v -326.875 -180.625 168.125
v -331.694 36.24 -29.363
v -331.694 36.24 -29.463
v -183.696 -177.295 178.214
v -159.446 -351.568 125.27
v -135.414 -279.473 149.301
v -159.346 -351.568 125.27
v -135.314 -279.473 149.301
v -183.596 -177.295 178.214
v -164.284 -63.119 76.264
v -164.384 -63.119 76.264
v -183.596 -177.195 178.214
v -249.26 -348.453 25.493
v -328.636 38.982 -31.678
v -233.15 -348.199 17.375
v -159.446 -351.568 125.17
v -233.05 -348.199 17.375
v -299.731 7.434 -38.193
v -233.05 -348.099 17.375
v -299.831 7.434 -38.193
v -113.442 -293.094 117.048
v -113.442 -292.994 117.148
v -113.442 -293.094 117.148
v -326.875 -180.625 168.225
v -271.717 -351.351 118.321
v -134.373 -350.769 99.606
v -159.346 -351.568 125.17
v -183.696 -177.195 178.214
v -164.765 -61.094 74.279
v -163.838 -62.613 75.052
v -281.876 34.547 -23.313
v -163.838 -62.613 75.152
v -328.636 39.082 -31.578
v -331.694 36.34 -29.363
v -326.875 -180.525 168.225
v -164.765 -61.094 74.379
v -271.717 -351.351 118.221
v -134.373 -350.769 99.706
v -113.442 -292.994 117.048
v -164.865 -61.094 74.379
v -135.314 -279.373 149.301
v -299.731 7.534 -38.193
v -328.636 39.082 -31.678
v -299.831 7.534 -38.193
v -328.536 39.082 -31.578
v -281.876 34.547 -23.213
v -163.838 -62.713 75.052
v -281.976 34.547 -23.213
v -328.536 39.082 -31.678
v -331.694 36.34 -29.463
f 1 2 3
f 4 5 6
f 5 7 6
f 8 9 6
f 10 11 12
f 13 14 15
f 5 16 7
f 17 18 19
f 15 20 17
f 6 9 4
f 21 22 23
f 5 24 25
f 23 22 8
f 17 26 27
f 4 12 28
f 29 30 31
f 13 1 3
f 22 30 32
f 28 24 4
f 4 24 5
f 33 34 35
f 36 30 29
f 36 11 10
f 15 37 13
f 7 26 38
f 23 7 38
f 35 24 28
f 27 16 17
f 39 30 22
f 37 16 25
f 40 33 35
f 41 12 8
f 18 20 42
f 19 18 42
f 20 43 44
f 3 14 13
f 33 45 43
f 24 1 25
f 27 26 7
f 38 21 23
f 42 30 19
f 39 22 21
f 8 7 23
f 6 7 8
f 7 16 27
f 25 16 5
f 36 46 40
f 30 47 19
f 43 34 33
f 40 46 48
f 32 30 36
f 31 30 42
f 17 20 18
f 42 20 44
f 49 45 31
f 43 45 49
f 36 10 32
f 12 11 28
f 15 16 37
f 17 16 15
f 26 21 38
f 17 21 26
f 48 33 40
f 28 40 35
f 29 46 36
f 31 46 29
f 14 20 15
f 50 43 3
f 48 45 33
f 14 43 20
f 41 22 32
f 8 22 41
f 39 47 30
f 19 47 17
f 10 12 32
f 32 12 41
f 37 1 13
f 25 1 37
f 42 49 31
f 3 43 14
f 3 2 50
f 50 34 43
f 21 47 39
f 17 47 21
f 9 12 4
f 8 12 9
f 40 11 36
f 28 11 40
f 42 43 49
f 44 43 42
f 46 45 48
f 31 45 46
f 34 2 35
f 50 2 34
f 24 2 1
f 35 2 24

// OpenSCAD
hull(){ translate([-135.413986014,-279.472727273,149.201398601])cube(0.1,0.1,0.1);
translate([-159.445678033,-351.567803331,125.169706582])cube(0.1,0.1,0.1);
translate([-249.260089686,-348.452914798,25.4932735426])cube(0.1,0.1,0.1);
translate([-271.717484516,-351.350643163,118.220581229])cube(0.1,0.1,0.1);
translate([-164.383561644,-63.2191780822,76.1643835616])cube(0.1,0.1,0.1);
translate([-183.695652174,-177.295247725,178.114256825])cube(0.1,0.1,0.1);
translate([-326.875,-180.625,168.125])cube(0.1,0.1,0.1);
translate([-328.63561418,38.9818631492,-31.6776586974])cube(0.1,0.1,0.1);
translate([-331.694214876,36.2396694215,-29.4628099174])cube(0.1,0.1,0.1);
translate([-134.472600175,-350.768942704,99.606166521])cube(0.1,0.1,0.1);
translate([-113.54202773,-293.093587522,117.048310225])cube(0.1,0.1,0.1);
translate([-233.150147203,-348.199214917,17.3748773307])cube(0.1,0.1,0.1);
translate([-299.831460674,7.43445692884,-38.1928838951])cube(0.1,0.1,0.1);
translate([-163.937753721,-62.7131258457,75.051871899])cube(0.1,0.1,0.1);
translate([-164.864864865,-61.1936936937,74.2792792793])cube(0.1,0.1,0.1);
translate([-281.97578426,34.4468904788,-23.3131535498])cube(0.1,0.1,0.1); }
